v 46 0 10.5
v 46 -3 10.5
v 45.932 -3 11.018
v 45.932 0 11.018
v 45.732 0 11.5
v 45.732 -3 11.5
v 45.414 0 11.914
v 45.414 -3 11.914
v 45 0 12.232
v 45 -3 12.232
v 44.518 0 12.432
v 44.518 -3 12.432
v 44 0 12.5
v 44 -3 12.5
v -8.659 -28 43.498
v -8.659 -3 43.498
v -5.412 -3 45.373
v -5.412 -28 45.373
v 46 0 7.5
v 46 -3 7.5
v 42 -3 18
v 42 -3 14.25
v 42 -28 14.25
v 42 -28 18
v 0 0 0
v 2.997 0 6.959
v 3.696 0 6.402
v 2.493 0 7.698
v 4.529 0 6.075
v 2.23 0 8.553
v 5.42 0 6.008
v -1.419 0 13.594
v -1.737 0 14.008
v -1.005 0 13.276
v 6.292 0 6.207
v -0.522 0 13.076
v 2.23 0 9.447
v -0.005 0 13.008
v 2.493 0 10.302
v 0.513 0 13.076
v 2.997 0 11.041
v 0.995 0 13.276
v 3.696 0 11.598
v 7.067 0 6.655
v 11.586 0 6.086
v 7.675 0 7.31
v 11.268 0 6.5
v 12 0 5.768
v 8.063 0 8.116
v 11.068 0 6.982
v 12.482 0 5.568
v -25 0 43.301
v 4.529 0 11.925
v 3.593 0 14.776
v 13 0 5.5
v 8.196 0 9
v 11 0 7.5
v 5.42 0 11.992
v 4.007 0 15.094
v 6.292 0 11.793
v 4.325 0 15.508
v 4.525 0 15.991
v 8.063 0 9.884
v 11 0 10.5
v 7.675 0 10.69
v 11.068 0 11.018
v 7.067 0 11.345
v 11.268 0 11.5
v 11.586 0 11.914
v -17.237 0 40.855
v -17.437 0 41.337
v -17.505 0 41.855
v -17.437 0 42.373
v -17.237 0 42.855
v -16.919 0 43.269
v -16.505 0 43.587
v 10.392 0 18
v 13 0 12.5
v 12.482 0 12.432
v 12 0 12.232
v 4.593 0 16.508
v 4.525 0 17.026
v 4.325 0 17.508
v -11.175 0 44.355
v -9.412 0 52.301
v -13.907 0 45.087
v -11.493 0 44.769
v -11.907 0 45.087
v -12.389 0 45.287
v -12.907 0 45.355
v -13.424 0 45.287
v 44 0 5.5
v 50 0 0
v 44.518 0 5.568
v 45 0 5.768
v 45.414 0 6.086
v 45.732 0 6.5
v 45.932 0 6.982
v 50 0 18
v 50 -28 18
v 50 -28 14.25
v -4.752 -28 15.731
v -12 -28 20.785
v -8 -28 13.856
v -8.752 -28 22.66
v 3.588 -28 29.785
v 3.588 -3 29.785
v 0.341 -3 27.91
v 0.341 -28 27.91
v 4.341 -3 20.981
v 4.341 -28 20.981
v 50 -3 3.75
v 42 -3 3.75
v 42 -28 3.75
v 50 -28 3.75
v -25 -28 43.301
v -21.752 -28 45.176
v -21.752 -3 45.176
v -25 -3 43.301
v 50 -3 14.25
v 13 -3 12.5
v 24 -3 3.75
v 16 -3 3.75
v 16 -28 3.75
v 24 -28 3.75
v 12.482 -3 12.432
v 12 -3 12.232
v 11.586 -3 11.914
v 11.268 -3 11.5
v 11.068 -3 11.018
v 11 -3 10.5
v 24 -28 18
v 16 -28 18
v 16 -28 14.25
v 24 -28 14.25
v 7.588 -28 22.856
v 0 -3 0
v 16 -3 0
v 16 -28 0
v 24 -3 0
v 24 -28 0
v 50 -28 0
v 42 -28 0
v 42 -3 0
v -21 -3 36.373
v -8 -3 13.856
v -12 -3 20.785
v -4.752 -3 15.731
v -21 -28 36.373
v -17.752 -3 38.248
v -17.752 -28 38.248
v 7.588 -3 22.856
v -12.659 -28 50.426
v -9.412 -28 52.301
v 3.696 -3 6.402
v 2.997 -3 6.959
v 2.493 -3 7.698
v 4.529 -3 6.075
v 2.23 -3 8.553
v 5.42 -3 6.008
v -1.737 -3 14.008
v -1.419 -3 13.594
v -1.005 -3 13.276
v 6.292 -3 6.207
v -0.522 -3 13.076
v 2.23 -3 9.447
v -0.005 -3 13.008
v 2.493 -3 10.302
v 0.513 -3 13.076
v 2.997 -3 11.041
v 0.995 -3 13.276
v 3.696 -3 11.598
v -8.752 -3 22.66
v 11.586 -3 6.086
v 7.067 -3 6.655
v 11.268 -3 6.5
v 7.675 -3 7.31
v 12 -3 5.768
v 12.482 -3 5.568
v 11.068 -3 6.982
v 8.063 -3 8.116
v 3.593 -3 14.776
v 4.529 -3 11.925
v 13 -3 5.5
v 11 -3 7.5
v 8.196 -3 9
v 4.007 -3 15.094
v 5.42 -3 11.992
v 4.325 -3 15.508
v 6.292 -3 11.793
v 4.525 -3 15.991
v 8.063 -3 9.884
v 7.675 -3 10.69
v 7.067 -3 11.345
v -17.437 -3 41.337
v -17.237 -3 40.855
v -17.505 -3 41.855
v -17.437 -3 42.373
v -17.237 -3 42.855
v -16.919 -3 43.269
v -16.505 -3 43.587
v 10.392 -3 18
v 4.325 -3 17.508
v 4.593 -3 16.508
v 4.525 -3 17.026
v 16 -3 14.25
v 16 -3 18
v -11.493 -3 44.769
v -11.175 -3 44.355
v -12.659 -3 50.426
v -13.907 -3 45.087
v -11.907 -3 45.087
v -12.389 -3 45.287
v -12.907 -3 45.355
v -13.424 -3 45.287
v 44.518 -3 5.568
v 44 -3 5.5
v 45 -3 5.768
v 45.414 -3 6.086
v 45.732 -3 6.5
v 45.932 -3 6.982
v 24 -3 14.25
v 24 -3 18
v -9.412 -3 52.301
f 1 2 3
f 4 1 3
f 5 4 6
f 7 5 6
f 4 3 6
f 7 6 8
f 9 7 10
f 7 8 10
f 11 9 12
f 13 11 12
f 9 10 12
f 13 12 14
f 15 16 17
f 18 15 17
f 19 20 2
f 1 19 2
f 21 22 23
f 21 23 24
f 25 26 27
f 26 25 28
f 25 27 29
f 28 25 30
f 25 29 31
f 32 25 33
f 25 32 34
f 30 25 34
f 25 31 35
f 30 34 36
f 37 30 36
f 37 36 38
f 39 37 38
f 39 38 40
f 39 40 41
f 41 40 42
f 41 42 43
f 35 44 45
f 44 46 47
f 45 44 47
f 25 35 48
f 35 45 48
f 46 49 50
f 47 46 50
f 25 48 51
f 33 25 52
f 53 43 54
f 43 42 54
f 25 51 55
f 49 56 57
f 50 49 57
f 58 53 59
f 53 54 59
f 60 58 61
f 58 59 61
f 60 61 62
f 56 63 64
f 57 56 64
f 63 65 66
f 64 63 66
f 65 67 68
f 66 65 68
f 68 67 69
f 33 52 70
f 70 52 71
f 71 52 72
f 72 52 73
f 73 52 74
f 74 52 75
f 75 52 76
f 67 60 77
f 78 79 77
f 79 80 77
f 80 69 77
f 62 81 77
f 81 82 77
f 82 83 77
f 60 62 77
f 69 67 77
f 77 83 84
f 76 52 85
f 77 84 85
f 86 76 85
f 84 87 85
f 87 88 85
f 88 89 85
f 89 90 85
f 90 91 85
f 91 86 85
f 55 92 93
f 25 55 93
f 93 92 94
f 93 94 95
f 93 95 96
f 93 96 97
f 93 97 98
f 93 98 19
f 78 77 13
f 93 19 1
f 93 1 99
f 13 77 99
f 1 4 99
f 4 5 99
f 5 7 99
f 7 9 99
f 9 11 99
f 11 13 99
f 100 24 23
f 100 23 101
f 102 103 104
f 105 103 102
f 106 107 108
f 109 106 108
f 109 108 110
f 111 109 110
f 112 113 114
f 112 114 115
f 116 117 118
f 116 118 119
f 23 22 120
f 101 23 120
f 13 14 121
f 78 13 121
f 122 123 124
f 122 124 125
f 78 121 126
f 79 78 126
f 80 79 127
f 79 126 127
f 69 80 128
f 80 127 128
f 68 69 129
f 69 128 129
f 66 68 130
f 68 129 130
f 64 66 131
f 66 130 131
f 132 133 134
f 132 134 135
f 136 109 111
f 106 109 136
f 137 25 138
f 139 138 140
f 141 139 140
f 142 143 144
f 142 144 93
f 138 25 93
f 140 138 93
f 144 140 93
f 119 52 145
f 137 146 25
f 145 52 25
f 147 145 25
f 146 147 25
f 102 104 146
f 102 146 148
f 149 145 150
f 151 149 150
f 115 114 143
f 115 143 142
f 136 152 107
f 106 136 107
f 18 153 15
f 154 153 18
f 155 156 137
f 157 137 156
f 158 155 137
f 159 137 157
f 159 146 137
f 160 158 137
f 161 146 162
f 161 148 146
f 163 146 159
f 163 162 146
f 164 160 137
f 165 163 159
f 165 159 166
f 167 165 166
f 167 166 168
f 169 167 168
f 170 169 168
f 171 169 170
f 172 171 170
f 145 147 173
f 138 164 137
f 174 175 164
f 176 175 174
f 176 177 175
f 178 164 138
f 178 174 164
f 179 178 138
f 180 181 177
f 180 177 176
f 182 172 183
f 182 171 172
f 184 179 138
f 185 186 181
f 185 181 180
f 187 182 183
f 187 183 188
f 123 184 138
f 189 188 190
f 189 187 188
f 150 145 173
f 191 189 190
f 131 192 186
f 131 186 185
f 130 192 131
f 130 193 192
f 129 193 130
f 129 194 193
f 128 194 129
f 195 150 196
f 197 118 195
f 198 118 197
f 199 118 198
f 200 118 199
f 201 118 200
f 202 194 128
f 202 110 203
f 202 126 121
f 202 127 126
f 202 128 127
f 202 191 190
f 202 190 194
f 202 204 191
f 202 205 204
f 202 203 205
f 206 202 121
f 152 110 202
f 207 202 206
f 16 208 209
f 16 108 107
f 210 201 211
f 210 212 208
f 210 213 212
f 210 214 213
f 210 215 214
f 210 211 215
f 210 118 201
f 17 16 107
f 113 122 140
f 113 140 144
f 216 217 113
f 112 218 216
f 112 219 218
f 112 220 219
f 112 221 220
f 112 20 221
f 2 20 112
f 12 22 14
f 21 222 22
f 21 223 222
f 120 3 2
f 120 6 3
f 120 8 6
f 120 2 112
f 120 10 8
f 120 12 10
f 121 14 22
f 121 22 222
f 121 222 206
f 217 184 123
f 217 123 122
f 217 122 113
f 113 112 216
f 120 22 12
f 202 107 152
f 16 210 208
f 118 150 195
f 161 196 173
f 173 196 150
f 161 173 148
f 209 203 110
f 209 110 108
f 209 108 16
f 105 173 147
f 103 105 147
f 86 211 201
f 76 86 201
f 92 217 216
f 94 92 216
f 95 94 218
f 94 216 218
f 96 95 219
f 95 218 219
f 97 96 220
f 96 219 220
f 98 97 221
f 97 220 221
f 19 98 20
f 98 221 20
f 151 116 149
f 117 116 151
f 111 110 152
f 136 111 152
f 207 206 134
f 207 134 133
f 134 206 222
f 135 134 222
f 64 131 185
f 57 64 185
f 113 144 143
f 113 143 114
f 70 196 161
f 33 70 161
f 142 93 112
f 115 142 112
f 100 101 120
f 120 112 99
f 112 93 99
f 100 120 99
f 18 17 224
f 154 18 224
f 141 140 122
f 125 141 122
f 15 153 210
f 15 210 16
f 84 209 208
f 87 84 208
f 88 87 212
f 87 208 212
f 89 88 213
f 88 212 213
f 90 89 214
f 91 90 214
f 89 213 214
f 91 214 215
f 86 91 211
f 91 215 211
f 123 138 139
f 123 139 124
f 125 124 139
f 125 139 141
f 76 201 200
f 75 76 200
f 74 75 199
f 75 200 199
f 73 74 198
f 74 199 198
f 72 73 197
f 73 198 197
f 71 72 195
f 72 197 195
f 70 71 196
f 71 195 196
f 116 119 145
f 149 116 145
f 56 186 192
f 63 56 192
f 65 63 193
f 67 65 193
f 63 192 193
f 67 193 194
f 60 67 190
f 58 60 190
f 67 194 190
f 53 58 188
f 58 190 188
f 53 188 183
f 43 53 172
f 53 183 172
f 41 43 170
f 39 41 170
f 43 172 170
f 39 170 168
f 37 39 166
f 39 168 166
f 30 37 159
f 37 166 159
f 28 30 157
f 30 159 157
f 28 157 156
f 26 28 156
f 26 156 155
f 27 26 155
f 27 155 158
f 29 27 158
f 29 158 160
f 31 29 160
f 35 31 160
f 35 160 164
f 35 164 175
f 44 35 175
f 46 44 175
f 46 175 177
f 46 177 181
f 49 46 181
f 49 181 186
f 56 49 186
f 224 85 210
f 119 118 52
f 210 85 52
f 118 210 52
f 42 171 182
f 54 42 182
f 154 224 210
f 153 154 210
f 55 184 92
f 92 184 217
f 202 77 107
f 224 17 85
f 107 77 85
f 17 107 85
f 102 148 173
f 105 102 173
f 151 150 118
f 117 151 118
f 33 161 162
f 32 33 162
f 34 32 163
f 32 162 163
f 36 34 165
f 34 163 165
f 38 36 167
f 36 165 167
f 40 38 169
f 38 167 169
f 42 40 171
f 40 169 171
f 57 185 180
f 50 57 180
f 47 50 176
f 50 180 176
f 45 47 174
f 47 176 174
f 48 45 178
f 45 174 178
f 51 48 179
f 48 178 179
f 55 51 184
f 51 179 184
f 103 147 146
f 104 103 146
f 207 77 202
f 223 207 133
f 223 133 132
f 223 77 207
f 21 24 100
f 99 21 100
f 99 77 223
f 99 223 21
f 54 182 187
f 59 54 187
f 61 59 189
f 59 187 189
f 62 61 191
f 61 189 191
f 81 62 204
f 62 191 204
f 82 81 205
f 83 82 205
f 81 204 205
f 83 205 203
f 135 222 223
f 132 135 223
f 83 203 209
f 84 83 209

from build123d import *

# Parameters (mm, degrees)
F1_DEPTH = 3
F2_W     = 8
F2_H     = 3.75
F3_DEPTH = 25
F4_R     = 3
F5_DEPTH = 3.001


with BuildPart() as f1:
    # F0 (on Front) → F1 (new body)
    with BuildSketch(Plane.XZ):
        Polygon((-25, 43.30127), (0, 0), (50, 0), (50, 18), (10.392305, 18), (-9.411543, 52.30127), align=None)
    extrude(amount=F1_DEPTH)

    # F2 (on face) → F3 (join)
    with BuildSketch(Plane.XZ.offset(3)):
        with Locations((46, 16.125)):
            Rectangle(F2_W, F2_H)
        with Locations((46, 1.875)):
            Rectangle(F2_W, F2_H)
        with Locations((20, 1.875)):
            Rectangle(F2_W, F2_H)
        with Locations((20, 16.125)):
            Rectangle(F2_W, F2_H)
        Polygon((4.340862, 20.981406), (7.588457, 22.856406), (3.588457, 29.78461), (0.340862, 27.90961), align=None)
        Polygon((-12, 20.78461), (-8, 13.856406), (-4.752405, 15.731406), (-8.752405, 22.65961), align=None)
        Polygon((-17.752405, 38.248067), (-21.752405, 45.17627), (-25, 43.30127), (-21, 36.373067), align=None)
        Polygon((-8.659138, 43.498067), (-5.411543, 45.373067), (-9.411543, 52.30127), (-12.659138, 50.42627), align=None)
    extrude(amount=F3_DEPTH)

    # F4 (on face) → F5 (cut, through all)
    with BuildSketch(Plane.XZ.offset(3)):
        with BuildLine():
            ThreePointArc((3.593267, 14.776279), (4.525118, 15.990692), (4.325318, 17.50833))
            Line((4.325318, 17.50833), (-11.174682, 44.355118))
            ThreePointArc((-11.174682, 44.355118), (-12.389095, 45.286969), (-13.906733, 45.087169))
            Line((-13.906733, 45.087169), (-16.504809, 43.587169))
            ThreePointArc((-16.504809, 43.587169), (-17.436661, 42.372756), (-17.23686, 40.855118))
            Line((-17.23686, 40.855118), (-1.73686, 14.00833))
            ThreePointArc((-1.73686, 14.00833), (-0.522448, 13.076479), (0.995191, 13.276279))
            Line((0.995191, 13.276279), (3.593267, 14.776279))
        make_face()
        with BuildLine():
            Line((44, 12.5), (13, 12.5))
            ThreePointArc((13, 12.5), (11.585786, 11.914214), (11, 10.5))
            Line((11, 10.5), (11, 7.5))
            ThreePointArc((11, 7.5), (11.585786, 6.085786), (13, 5.5))
            Line((13, 5.5), (44, 5.5))
            ThreePointArc((44, 5.5), (45.414214, 6.085786), (46, 7.5))
            Line((46, 7.5), (46, 10.5))
            ThreePointArc((46, 10.5), (45.414214, 11.914214), (44, 12.5))
        make_face()
        with Locations((5.196152, 9)):
            Circle(F4_R)
    extrude(amount=-F5_DEPTH, mode=Mode.SUBTRACT)


solid = f1.part
